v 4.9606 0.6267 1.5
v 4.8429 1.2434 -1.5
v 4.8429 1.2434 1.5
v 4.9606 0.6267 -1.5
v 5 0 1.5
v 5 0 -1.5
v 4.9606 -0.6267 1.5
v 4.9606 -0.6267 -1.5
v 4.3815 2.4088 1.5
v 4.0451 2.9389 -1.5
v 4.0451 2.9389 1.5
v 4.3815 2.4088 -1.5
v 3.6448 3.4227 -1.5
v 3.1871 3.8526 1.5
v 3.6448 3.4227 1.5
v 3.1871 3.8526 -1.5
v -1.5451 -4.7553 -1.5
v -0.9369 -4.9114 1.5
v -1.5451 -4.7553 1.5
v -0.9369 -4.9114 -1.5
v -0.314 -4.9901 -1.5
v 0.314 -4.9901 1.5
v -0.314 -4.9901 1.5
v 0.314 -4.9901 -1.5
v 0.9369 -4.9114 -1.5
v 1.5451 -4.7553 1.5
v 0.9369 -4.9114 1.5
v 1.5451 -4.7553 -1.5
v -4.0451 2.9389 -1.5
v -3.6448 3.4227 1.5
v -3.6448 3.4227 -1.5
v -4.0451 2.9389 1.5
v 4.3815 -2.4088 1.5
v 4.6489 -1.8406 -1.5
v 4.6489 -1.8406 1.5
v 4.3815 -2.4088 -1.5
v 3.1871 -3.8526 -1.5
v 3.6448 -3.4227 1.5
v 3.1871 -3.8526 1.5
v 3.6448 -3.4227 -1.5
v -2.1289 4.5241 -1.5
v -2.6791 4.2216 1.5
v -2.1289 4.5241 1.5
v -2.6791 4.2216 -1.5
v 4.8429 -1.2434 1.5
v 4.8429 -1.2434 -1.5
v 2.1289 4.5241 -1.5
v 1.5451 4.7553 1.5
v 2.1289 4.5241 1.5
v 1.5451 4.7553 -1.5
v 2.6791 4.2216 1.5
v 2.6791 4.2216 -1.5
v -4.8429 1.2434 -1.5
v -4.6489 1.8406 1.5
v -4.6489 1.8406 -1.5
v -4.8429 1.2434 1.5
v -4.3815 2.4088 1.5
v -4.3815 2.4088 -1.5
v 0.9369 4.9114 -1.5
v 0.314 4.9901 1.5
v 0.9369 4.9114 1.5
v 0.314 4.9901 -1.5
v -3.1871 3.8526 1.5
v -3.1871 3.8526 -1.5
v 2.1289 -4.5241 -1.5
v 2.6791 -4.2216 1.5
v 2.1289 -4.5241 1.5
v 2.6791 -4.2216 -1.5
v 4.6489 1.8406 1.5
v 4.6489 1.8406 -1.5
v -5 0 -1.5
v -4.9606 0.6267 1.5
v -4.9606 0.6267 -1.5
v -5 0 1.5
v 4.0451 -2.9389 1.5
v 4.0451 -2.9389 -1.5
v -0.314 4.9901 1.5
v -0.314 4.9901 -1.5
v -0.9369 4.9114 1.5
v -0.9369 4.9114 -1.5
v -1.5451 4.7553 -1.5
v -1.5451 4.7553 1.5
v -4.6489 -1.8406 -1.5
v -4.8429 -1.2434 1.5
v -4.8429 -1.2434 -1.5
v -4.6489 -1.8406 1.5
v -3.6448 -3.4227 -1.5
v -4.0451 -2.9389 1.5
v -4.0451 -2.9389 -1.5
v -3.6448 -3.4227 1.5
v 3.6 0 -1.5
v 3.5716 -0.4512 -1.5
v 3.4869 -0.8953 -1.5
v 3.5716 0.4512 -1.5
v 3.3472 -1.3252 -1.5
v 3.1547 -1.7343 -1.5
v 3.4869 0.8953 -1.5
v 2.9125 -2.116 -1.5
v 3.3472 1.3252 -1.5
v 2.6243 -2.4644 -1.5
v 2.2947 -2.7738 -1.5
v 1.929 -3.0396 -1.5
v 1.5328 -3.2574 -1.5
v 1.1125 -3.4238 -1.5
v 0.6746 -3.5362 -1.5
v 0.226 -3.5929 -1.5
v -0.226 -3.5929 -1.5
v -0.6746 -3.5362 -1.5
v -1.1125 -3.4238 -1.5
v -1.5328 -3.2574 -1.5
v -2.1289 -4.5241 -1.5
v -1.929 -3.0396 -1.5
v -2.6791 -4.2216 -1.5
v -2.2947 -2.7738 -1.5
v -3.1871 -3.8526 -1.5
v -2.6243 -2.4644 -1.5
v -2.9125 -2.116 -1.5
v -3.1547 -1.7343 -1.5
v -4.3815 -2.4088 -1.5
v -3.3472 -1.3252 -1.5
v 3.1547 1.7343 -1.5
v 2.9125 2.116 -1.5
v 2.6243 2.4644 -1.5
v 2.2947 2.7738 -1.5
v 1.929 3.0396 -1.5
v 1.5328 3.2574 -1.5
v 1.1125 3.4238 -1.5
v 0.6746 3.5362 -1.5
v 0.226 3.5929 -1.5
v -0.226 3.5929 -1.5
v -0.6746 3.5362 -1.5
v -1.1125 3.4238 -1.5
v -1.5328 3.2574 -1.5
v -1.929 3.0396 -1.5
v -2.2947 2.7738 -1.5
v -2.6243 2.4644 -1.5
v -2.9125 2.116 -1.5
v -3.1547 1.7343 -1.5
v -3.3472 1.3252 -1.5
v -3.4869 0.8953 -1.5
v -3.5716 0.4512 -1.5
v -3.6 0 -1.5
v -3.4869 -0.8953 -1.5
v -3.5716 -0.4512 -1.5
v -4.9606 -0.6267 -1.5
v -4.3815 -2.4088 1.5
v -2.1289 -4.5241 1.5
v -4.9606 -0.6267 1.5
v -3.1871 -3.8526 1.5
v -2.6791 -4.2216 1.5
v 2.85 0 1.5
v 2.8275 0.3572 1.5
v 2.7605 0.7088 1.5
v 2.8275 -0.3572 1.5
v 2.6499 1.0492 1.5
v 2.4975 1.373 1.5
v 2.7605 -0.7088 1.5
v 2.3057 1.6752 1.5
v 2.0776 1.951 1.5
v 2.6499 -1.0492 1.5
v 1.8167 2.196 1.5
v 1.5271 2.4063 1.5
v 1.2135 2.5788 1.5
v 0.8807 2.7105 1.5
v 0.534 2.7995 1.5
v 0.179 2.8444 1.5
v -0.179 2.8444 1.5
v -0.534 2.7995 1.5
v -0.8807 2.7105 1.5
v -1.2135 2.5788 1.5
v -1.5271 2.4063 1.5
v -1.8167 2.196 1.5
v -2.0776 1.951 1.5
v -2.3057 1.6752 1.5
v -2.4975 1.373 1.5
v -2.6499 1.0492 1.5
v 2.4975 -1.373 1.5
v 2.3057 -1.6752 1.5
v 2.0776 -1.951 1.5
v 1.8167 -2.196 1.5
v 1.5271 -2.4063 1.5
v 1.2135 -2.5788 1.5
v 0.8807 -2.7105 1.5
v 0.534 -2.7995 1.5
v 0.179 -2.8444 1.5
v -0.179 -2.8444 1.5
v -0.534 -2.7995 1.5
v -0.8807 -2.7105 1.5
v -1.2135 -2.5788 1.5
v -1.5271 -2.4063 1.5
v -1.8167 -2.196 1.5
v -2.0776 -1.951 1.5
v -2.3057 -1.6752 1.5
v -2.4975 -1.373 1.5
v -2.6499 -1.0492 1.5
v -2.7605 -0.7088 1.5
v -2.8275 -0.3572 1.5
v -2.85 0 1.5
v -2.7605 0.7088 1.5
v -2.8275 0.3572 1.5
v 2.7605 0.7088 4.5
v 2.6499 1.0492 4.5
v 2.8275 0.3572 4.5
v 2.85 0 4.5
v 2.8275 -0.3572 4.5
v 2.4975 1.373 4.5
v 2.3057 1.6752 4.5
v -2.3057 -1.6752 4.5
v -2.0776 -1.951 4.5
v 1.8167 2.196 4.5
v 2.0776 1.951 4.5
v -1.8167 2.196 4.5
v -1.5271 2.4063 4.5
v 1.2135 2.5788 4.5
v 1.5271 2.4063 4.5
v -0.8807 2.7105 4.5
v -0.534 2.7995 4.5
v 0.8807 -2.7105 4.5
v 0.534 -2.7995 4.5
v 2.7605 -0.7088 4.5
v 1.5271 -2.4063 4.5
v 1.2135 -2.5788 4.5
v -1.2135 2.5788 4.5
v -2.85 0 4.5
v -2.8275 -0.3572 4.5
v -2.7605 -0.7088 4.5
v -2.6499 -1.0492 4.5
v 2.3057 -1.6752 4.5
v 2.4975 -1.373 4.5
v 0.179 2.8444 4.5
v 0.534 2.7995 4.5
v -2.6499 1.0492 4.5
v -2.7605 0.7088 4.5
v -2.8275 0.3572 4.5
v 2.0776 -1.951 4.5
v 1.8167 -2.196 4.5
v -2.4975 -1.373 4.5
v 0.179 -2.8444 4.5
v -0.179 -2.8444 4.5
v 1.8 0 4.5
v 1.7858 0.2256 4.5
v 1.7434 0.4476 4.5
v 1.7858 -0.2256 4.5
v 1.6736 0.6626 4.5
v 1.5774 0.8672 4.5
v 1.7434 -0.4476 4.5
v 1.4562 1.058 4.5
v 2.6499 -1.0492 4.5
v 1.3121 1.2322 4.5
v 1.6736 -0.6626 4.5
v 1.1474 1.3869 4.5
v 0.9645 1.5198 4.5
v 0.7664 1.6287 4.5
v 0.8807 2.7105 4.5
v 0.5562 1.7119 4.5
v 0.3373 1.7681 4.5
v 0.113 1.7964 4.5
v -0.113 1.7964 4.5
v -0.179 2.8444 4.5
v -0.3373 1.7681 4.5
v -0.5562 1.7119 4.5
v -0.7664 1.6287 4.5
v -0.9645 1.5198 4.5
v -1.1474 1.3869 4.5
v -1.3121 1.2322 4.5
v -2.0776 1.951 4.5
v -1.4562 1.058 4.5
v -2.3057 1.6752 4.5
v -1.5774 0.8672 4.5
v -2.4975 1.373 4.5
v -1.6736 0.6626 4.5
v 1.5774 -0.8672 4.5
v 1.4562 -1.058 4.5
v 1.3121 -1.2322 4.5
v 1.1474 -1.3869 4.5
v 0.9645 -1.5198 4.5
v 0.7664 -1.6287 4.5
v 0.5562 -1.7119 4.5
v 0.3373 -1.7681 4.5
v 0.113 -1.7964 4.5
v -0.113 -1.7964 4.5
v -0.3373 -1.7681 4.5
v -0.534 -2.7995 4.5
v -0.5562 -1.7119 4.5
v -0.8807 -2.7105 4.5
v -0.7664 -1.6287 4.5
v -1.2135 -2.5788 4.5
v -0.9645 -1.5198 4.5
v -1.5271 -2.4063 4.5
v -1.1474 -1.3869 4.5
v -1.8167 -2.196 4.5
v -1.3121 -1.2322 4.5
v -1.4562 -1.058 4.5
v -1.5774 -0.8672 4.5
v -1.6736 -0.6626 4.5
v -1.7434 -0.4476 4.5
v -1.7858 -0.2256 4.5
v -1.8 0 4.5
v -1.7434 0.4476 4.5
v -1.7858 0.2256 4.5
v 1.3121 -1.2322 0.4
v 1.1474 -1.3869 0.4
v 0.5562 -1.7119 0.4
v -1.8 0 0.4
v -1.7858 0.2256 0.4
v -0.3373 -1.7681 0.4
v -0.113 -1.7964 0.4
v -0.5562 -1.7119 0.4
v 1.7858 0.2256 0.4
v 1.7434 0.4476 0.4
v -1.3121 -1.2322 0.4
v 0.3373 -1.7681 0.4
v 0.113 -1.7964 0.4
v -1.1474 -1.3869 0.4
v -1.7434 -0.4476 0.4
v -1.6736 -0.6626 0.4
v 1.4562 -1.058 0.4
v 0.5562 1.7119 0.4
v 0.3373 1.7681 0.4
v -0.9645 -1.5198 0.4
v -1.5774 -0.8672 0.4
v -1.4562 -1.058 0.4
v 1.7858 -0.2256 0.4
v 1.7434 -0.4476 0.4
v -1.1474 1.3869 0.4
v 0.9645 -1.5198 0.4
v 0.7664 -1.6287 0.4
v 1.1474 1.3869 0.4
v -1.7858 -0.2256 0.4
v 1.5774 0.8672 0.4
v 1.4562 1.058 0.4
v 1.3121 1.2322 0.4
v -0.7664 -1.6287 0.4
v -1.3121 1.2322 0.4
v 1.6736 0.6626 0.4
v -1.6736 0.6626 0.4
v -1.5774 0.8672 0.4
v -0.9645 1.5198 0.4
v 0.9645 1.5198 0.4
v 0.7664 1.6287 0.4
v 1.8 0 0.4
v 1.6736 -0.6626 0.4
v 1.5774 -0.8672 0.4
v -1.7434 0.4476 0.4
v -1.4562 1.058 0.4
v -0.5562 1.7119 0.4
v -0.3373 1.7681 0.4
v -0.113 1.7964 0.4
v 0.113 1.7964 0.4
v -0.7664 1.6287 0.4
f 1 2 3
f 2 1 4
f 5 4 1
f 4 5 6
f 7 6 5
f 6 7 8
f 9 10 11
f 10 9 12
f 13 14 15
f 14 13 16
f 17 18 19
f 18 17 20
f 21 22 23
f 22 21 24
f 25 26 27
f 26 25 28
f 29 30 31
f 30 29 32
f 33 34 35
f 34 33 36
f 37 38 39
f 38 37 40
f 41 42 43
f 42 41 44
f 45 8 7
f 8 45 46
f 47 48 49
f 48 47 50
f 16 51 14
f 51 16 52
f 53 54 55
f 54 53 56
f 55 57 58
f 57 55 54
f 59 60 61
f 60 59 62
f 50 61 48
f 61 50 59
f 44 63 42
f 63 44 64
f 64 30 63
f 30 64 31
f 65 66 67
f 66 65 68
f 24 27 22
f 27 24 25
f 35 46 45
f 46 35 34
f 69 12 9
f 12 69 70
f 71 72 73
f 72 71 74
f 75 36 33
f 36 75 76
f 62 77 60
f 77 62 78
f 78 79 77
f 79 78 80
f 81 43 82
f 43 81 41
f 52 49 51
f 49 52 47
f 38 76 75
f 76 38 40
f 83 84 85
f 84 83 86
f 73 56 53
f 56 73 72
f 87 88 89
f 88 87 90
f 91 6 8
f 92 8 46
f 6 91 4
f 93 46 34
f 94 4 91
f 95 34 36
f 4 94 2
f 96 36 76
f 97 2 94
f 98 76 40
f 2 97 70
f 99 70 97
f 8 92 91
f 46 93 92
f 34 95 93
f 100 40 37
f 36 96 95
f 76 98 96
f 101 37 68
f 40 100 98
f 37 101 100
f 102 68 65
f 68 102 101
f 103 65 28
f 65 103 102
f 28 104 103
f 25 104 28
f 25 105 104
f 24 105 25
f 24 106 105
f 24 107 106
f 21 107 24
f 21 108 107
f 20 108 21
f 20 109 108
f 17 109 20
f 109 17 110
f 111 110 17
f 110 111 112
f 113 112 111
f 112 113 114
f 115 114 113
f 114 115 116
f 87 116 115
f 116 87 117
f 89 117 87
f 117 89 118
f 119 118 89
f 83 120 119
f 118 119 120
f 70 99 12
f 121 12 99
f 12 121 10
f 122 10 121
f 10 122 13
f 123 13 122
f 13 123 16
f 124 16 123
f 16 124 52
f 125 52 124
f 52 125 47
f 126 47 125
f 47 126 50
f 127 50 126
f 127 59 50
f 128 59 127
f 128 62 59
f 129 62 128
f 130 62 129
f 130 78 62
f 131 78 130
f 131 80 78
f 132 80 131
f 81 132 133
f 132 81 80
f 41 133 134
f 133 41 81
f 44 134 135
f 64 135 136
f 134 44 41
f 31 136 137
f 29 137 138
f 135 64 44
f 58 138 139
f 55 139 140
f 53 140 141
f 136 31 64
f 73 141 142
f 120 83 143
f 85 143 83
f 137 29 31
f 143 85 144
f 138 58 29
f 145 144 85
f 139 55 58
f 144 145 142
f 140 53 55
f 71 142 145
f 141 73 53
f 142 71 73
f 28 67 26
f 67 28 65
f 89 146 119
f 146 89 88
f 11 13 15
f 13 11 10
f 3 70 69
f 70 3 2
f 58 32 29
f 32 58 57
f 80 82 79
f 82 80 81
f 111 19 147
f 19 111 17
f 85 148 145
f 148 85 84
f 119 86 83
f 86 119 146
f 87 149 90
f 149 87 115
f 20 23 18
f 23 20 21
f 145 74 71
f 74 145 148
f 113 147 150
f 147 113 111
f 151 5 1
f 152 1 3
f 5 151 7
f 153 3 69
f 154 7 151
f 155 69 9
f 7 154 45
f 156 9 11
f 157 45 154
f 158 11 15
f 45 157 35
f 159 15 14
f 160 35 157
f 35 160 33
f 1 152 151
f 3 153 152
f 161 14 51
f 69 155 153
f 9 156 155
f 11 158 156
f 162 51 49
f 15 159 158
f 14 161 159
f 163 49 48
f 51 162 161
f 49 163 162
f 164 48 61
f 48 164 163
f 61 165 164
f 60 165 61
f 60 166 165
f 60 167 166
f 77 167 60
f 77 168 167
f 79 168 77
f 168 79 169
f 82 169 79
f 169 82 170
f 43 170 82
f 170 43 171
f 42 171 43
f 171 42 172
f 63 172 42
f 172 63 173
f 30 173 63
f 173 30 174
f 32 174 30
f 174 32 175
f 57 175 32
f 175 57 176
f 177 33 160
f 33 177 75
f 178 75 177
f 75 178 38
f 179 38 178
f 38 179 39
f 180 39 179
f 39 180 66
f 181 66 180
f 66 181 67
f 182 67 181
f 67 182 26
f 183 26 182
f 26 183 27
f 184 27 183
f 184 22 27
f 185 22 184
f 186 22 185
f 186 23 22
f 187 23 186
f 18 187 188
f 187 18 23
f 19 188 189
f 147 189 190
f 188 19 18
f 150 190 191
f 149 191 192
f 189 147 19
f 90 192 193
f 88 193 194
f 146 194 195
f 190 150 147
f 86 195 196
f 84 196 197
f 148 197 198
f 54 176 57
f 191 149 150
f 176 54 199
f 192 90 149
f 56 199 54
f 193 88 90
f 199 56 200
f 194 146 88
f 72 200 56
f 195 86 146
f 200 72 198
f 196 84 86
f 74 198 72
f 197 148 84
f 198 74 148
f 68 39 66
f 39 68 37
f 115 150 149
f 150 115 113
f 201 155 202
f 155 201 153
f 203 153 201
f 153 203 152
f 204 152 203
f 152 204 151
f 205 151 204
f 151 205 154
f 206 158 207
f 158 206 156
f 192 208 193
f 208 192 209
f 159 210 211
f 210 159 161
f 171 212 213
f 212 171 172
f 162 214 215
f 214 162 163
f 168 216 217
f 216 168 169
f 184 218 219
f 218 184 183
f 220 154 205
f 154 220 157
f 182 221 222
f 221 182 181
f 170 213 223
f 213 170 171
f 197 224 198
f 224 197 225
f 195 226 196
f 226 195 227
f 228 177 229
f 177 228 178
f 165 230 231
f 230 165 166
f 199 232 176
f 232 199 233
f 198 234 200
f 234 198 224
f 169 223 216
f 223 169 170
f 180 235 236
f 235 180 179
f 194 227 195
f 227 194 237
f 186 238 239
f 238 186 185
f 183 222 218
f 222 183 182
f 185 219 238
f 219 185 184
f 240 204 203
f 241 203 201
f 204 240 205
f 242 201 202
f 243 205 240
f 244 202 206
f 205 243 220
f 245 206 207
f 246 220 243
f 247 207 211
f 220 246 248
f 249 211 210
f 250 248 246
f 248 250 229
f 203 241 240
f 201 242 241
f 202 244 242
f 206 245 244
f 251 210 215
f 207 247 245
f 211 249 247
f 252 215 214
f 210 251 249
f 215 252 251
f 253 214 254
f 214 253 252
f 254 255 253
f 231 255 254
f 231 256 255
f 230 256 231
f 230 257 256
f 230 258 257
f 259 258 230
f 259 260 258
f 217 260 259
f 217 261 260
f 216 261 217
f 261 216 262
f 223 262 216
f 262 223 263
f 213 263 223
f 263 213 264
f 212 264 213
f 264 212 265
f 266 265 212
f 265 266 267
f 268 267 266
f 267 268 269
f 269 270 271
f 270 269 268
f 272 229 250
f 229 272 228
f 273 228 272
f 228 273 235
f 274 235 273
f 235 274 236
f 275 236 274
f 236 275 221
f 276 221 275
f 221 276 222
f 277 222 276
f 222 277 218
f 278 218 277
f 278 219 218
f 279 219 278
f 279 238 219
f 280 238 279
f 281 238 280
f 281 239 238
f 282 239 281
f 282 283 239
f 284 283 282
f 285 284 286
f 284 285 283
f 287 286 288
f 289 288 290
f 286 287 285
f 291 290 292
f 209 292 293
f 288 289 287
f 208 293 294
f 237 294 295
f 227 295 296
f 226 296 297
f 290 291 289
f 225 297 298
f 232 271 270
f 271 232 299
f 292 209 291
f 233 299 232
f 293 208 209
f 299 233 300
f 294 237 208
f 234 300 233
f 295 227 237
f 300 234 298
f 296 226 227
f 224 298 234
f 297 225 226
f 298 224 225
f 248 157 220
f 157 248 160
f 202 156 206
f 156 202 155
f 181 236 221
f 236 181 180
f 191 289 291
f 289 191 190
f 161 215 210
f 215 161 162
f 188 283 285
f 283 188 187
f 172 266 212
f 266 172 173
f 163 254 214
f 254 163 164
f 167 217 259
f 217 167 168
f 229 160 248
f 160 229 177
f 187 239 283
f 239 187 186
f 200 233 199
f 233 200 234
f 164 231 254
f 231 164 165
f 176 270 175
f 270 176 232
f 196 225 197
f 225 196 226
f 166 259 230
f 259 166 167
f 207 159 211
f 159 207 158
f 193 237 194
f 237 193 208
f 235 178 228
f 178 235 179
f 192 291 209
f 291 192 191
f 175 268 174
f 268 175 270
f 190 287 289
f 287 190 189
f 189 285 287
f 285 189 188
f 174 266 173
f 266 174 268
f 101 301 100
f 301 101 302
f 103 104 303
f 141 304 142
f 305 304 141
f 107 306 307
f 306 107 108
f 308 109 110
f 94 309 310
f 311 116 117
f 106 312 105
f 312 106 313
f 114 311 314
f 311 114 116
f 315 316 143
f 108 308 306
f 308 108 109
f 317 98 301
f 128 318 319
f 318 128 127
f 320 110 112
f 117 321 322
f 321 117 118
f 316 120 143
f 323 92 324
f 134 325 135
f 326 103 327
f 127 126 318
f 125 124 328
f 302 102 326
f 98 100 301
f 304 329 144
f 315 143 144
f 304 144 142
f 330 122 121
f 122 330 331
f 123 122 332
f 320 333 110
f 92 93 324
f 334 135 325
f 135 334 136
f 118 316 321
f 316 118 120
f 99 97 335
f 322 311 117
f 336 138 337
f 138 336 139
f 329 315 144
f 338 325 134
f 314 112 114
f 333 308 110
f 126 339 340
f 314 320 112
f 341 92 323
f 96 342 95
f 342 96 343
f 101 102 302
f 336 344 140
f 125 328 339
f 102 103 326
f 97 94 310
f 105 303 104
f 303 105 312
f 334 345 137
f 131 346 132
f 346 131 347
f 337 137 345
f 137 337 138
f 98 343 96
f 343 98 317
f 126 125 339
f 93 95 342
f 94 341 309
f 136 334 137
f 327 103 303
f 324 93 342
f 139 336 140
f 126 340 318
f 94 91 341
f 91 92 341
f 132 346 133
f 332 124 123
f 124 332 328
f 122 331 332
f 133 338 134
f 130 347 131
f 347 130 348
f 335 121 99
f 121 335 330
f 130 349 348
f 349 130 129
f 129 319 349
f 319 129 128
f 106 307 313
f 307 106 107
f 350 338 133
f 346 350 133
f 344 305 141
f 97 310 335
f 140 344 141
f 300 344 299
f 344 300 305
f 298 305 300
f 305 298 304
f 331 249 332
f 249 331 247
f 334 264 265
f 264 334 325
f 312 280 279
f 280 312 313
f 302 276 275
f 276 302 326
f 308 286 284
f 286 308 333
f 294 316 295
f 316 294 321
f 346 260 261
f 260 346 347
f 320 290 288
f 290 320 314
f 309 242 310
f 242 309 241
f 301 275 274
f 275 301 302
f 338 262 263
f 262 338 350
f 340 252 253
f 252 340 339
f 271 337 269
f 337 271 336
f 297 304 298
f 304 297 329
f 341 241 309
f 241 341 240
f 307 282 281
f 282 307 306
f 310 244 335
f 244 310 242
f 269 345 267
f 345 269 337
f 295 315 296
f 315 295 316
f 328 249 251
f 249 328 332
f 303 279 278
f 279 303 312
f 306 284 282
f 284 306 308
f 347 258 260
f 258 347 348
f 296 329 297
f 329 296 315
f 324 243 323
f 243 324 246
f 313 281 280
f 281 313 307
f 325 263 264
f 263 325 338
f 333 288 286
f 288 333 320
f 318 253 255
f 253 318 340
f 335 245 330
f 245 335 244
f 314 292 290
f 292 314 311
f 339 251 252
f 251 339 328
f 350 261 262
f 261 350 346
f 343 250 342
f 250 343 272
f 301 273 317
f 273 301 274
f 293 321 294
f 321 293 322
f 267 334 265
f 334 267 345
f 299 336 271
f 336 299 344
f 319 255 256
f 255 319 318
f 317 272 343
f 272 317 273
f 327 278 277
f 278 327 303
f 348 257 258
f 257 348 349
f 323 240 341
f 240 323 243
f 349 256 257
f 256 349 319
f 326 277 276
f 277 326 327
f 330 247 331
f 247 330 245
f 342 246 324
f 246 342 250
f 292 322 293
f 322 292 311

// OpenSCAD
$fn = 50;


difference() {
	union() {
		translate(v = [0, 0, -1.5000000000]) {
			cylinder(h = 3, r = 5.0000000000);
		}
		translate(v = [0, 0, -1.5000000000]) {
			cylinder(h = 6, r = 2.8500000000);
		}
	}
	union() {
		translate(v = [0, 0, -1.5000000000]) {
			rotate(a = [0, 180, 0]) {
				difference() {
					union() {
						translate(v = [0, 0, -6.0000000000]) {
							cylinder(h = 6, r = 1.5000000000);
						}
						translate(v = [0, 0, -1.9000000000]) {
							cylinder(h = 1.9000000000, r1 = 1.8000000000, r2 = 3.6000000000);
						}
						translate(v = [0, 0, -6.0000000000]) {
							cylinder(h = 6, r = 1.8000000000);
						}
						translate(v = [0, 0, -6.0000000000]) {
							cylinder(h = 6, r = 1.5000000000);
						}
					}
					union();
				}
			}
		}
		translate(v = [0, 0, -50.0000000000]) {
			cylinder(h = 100, r = 1.8000000000);
		}
	}
}
